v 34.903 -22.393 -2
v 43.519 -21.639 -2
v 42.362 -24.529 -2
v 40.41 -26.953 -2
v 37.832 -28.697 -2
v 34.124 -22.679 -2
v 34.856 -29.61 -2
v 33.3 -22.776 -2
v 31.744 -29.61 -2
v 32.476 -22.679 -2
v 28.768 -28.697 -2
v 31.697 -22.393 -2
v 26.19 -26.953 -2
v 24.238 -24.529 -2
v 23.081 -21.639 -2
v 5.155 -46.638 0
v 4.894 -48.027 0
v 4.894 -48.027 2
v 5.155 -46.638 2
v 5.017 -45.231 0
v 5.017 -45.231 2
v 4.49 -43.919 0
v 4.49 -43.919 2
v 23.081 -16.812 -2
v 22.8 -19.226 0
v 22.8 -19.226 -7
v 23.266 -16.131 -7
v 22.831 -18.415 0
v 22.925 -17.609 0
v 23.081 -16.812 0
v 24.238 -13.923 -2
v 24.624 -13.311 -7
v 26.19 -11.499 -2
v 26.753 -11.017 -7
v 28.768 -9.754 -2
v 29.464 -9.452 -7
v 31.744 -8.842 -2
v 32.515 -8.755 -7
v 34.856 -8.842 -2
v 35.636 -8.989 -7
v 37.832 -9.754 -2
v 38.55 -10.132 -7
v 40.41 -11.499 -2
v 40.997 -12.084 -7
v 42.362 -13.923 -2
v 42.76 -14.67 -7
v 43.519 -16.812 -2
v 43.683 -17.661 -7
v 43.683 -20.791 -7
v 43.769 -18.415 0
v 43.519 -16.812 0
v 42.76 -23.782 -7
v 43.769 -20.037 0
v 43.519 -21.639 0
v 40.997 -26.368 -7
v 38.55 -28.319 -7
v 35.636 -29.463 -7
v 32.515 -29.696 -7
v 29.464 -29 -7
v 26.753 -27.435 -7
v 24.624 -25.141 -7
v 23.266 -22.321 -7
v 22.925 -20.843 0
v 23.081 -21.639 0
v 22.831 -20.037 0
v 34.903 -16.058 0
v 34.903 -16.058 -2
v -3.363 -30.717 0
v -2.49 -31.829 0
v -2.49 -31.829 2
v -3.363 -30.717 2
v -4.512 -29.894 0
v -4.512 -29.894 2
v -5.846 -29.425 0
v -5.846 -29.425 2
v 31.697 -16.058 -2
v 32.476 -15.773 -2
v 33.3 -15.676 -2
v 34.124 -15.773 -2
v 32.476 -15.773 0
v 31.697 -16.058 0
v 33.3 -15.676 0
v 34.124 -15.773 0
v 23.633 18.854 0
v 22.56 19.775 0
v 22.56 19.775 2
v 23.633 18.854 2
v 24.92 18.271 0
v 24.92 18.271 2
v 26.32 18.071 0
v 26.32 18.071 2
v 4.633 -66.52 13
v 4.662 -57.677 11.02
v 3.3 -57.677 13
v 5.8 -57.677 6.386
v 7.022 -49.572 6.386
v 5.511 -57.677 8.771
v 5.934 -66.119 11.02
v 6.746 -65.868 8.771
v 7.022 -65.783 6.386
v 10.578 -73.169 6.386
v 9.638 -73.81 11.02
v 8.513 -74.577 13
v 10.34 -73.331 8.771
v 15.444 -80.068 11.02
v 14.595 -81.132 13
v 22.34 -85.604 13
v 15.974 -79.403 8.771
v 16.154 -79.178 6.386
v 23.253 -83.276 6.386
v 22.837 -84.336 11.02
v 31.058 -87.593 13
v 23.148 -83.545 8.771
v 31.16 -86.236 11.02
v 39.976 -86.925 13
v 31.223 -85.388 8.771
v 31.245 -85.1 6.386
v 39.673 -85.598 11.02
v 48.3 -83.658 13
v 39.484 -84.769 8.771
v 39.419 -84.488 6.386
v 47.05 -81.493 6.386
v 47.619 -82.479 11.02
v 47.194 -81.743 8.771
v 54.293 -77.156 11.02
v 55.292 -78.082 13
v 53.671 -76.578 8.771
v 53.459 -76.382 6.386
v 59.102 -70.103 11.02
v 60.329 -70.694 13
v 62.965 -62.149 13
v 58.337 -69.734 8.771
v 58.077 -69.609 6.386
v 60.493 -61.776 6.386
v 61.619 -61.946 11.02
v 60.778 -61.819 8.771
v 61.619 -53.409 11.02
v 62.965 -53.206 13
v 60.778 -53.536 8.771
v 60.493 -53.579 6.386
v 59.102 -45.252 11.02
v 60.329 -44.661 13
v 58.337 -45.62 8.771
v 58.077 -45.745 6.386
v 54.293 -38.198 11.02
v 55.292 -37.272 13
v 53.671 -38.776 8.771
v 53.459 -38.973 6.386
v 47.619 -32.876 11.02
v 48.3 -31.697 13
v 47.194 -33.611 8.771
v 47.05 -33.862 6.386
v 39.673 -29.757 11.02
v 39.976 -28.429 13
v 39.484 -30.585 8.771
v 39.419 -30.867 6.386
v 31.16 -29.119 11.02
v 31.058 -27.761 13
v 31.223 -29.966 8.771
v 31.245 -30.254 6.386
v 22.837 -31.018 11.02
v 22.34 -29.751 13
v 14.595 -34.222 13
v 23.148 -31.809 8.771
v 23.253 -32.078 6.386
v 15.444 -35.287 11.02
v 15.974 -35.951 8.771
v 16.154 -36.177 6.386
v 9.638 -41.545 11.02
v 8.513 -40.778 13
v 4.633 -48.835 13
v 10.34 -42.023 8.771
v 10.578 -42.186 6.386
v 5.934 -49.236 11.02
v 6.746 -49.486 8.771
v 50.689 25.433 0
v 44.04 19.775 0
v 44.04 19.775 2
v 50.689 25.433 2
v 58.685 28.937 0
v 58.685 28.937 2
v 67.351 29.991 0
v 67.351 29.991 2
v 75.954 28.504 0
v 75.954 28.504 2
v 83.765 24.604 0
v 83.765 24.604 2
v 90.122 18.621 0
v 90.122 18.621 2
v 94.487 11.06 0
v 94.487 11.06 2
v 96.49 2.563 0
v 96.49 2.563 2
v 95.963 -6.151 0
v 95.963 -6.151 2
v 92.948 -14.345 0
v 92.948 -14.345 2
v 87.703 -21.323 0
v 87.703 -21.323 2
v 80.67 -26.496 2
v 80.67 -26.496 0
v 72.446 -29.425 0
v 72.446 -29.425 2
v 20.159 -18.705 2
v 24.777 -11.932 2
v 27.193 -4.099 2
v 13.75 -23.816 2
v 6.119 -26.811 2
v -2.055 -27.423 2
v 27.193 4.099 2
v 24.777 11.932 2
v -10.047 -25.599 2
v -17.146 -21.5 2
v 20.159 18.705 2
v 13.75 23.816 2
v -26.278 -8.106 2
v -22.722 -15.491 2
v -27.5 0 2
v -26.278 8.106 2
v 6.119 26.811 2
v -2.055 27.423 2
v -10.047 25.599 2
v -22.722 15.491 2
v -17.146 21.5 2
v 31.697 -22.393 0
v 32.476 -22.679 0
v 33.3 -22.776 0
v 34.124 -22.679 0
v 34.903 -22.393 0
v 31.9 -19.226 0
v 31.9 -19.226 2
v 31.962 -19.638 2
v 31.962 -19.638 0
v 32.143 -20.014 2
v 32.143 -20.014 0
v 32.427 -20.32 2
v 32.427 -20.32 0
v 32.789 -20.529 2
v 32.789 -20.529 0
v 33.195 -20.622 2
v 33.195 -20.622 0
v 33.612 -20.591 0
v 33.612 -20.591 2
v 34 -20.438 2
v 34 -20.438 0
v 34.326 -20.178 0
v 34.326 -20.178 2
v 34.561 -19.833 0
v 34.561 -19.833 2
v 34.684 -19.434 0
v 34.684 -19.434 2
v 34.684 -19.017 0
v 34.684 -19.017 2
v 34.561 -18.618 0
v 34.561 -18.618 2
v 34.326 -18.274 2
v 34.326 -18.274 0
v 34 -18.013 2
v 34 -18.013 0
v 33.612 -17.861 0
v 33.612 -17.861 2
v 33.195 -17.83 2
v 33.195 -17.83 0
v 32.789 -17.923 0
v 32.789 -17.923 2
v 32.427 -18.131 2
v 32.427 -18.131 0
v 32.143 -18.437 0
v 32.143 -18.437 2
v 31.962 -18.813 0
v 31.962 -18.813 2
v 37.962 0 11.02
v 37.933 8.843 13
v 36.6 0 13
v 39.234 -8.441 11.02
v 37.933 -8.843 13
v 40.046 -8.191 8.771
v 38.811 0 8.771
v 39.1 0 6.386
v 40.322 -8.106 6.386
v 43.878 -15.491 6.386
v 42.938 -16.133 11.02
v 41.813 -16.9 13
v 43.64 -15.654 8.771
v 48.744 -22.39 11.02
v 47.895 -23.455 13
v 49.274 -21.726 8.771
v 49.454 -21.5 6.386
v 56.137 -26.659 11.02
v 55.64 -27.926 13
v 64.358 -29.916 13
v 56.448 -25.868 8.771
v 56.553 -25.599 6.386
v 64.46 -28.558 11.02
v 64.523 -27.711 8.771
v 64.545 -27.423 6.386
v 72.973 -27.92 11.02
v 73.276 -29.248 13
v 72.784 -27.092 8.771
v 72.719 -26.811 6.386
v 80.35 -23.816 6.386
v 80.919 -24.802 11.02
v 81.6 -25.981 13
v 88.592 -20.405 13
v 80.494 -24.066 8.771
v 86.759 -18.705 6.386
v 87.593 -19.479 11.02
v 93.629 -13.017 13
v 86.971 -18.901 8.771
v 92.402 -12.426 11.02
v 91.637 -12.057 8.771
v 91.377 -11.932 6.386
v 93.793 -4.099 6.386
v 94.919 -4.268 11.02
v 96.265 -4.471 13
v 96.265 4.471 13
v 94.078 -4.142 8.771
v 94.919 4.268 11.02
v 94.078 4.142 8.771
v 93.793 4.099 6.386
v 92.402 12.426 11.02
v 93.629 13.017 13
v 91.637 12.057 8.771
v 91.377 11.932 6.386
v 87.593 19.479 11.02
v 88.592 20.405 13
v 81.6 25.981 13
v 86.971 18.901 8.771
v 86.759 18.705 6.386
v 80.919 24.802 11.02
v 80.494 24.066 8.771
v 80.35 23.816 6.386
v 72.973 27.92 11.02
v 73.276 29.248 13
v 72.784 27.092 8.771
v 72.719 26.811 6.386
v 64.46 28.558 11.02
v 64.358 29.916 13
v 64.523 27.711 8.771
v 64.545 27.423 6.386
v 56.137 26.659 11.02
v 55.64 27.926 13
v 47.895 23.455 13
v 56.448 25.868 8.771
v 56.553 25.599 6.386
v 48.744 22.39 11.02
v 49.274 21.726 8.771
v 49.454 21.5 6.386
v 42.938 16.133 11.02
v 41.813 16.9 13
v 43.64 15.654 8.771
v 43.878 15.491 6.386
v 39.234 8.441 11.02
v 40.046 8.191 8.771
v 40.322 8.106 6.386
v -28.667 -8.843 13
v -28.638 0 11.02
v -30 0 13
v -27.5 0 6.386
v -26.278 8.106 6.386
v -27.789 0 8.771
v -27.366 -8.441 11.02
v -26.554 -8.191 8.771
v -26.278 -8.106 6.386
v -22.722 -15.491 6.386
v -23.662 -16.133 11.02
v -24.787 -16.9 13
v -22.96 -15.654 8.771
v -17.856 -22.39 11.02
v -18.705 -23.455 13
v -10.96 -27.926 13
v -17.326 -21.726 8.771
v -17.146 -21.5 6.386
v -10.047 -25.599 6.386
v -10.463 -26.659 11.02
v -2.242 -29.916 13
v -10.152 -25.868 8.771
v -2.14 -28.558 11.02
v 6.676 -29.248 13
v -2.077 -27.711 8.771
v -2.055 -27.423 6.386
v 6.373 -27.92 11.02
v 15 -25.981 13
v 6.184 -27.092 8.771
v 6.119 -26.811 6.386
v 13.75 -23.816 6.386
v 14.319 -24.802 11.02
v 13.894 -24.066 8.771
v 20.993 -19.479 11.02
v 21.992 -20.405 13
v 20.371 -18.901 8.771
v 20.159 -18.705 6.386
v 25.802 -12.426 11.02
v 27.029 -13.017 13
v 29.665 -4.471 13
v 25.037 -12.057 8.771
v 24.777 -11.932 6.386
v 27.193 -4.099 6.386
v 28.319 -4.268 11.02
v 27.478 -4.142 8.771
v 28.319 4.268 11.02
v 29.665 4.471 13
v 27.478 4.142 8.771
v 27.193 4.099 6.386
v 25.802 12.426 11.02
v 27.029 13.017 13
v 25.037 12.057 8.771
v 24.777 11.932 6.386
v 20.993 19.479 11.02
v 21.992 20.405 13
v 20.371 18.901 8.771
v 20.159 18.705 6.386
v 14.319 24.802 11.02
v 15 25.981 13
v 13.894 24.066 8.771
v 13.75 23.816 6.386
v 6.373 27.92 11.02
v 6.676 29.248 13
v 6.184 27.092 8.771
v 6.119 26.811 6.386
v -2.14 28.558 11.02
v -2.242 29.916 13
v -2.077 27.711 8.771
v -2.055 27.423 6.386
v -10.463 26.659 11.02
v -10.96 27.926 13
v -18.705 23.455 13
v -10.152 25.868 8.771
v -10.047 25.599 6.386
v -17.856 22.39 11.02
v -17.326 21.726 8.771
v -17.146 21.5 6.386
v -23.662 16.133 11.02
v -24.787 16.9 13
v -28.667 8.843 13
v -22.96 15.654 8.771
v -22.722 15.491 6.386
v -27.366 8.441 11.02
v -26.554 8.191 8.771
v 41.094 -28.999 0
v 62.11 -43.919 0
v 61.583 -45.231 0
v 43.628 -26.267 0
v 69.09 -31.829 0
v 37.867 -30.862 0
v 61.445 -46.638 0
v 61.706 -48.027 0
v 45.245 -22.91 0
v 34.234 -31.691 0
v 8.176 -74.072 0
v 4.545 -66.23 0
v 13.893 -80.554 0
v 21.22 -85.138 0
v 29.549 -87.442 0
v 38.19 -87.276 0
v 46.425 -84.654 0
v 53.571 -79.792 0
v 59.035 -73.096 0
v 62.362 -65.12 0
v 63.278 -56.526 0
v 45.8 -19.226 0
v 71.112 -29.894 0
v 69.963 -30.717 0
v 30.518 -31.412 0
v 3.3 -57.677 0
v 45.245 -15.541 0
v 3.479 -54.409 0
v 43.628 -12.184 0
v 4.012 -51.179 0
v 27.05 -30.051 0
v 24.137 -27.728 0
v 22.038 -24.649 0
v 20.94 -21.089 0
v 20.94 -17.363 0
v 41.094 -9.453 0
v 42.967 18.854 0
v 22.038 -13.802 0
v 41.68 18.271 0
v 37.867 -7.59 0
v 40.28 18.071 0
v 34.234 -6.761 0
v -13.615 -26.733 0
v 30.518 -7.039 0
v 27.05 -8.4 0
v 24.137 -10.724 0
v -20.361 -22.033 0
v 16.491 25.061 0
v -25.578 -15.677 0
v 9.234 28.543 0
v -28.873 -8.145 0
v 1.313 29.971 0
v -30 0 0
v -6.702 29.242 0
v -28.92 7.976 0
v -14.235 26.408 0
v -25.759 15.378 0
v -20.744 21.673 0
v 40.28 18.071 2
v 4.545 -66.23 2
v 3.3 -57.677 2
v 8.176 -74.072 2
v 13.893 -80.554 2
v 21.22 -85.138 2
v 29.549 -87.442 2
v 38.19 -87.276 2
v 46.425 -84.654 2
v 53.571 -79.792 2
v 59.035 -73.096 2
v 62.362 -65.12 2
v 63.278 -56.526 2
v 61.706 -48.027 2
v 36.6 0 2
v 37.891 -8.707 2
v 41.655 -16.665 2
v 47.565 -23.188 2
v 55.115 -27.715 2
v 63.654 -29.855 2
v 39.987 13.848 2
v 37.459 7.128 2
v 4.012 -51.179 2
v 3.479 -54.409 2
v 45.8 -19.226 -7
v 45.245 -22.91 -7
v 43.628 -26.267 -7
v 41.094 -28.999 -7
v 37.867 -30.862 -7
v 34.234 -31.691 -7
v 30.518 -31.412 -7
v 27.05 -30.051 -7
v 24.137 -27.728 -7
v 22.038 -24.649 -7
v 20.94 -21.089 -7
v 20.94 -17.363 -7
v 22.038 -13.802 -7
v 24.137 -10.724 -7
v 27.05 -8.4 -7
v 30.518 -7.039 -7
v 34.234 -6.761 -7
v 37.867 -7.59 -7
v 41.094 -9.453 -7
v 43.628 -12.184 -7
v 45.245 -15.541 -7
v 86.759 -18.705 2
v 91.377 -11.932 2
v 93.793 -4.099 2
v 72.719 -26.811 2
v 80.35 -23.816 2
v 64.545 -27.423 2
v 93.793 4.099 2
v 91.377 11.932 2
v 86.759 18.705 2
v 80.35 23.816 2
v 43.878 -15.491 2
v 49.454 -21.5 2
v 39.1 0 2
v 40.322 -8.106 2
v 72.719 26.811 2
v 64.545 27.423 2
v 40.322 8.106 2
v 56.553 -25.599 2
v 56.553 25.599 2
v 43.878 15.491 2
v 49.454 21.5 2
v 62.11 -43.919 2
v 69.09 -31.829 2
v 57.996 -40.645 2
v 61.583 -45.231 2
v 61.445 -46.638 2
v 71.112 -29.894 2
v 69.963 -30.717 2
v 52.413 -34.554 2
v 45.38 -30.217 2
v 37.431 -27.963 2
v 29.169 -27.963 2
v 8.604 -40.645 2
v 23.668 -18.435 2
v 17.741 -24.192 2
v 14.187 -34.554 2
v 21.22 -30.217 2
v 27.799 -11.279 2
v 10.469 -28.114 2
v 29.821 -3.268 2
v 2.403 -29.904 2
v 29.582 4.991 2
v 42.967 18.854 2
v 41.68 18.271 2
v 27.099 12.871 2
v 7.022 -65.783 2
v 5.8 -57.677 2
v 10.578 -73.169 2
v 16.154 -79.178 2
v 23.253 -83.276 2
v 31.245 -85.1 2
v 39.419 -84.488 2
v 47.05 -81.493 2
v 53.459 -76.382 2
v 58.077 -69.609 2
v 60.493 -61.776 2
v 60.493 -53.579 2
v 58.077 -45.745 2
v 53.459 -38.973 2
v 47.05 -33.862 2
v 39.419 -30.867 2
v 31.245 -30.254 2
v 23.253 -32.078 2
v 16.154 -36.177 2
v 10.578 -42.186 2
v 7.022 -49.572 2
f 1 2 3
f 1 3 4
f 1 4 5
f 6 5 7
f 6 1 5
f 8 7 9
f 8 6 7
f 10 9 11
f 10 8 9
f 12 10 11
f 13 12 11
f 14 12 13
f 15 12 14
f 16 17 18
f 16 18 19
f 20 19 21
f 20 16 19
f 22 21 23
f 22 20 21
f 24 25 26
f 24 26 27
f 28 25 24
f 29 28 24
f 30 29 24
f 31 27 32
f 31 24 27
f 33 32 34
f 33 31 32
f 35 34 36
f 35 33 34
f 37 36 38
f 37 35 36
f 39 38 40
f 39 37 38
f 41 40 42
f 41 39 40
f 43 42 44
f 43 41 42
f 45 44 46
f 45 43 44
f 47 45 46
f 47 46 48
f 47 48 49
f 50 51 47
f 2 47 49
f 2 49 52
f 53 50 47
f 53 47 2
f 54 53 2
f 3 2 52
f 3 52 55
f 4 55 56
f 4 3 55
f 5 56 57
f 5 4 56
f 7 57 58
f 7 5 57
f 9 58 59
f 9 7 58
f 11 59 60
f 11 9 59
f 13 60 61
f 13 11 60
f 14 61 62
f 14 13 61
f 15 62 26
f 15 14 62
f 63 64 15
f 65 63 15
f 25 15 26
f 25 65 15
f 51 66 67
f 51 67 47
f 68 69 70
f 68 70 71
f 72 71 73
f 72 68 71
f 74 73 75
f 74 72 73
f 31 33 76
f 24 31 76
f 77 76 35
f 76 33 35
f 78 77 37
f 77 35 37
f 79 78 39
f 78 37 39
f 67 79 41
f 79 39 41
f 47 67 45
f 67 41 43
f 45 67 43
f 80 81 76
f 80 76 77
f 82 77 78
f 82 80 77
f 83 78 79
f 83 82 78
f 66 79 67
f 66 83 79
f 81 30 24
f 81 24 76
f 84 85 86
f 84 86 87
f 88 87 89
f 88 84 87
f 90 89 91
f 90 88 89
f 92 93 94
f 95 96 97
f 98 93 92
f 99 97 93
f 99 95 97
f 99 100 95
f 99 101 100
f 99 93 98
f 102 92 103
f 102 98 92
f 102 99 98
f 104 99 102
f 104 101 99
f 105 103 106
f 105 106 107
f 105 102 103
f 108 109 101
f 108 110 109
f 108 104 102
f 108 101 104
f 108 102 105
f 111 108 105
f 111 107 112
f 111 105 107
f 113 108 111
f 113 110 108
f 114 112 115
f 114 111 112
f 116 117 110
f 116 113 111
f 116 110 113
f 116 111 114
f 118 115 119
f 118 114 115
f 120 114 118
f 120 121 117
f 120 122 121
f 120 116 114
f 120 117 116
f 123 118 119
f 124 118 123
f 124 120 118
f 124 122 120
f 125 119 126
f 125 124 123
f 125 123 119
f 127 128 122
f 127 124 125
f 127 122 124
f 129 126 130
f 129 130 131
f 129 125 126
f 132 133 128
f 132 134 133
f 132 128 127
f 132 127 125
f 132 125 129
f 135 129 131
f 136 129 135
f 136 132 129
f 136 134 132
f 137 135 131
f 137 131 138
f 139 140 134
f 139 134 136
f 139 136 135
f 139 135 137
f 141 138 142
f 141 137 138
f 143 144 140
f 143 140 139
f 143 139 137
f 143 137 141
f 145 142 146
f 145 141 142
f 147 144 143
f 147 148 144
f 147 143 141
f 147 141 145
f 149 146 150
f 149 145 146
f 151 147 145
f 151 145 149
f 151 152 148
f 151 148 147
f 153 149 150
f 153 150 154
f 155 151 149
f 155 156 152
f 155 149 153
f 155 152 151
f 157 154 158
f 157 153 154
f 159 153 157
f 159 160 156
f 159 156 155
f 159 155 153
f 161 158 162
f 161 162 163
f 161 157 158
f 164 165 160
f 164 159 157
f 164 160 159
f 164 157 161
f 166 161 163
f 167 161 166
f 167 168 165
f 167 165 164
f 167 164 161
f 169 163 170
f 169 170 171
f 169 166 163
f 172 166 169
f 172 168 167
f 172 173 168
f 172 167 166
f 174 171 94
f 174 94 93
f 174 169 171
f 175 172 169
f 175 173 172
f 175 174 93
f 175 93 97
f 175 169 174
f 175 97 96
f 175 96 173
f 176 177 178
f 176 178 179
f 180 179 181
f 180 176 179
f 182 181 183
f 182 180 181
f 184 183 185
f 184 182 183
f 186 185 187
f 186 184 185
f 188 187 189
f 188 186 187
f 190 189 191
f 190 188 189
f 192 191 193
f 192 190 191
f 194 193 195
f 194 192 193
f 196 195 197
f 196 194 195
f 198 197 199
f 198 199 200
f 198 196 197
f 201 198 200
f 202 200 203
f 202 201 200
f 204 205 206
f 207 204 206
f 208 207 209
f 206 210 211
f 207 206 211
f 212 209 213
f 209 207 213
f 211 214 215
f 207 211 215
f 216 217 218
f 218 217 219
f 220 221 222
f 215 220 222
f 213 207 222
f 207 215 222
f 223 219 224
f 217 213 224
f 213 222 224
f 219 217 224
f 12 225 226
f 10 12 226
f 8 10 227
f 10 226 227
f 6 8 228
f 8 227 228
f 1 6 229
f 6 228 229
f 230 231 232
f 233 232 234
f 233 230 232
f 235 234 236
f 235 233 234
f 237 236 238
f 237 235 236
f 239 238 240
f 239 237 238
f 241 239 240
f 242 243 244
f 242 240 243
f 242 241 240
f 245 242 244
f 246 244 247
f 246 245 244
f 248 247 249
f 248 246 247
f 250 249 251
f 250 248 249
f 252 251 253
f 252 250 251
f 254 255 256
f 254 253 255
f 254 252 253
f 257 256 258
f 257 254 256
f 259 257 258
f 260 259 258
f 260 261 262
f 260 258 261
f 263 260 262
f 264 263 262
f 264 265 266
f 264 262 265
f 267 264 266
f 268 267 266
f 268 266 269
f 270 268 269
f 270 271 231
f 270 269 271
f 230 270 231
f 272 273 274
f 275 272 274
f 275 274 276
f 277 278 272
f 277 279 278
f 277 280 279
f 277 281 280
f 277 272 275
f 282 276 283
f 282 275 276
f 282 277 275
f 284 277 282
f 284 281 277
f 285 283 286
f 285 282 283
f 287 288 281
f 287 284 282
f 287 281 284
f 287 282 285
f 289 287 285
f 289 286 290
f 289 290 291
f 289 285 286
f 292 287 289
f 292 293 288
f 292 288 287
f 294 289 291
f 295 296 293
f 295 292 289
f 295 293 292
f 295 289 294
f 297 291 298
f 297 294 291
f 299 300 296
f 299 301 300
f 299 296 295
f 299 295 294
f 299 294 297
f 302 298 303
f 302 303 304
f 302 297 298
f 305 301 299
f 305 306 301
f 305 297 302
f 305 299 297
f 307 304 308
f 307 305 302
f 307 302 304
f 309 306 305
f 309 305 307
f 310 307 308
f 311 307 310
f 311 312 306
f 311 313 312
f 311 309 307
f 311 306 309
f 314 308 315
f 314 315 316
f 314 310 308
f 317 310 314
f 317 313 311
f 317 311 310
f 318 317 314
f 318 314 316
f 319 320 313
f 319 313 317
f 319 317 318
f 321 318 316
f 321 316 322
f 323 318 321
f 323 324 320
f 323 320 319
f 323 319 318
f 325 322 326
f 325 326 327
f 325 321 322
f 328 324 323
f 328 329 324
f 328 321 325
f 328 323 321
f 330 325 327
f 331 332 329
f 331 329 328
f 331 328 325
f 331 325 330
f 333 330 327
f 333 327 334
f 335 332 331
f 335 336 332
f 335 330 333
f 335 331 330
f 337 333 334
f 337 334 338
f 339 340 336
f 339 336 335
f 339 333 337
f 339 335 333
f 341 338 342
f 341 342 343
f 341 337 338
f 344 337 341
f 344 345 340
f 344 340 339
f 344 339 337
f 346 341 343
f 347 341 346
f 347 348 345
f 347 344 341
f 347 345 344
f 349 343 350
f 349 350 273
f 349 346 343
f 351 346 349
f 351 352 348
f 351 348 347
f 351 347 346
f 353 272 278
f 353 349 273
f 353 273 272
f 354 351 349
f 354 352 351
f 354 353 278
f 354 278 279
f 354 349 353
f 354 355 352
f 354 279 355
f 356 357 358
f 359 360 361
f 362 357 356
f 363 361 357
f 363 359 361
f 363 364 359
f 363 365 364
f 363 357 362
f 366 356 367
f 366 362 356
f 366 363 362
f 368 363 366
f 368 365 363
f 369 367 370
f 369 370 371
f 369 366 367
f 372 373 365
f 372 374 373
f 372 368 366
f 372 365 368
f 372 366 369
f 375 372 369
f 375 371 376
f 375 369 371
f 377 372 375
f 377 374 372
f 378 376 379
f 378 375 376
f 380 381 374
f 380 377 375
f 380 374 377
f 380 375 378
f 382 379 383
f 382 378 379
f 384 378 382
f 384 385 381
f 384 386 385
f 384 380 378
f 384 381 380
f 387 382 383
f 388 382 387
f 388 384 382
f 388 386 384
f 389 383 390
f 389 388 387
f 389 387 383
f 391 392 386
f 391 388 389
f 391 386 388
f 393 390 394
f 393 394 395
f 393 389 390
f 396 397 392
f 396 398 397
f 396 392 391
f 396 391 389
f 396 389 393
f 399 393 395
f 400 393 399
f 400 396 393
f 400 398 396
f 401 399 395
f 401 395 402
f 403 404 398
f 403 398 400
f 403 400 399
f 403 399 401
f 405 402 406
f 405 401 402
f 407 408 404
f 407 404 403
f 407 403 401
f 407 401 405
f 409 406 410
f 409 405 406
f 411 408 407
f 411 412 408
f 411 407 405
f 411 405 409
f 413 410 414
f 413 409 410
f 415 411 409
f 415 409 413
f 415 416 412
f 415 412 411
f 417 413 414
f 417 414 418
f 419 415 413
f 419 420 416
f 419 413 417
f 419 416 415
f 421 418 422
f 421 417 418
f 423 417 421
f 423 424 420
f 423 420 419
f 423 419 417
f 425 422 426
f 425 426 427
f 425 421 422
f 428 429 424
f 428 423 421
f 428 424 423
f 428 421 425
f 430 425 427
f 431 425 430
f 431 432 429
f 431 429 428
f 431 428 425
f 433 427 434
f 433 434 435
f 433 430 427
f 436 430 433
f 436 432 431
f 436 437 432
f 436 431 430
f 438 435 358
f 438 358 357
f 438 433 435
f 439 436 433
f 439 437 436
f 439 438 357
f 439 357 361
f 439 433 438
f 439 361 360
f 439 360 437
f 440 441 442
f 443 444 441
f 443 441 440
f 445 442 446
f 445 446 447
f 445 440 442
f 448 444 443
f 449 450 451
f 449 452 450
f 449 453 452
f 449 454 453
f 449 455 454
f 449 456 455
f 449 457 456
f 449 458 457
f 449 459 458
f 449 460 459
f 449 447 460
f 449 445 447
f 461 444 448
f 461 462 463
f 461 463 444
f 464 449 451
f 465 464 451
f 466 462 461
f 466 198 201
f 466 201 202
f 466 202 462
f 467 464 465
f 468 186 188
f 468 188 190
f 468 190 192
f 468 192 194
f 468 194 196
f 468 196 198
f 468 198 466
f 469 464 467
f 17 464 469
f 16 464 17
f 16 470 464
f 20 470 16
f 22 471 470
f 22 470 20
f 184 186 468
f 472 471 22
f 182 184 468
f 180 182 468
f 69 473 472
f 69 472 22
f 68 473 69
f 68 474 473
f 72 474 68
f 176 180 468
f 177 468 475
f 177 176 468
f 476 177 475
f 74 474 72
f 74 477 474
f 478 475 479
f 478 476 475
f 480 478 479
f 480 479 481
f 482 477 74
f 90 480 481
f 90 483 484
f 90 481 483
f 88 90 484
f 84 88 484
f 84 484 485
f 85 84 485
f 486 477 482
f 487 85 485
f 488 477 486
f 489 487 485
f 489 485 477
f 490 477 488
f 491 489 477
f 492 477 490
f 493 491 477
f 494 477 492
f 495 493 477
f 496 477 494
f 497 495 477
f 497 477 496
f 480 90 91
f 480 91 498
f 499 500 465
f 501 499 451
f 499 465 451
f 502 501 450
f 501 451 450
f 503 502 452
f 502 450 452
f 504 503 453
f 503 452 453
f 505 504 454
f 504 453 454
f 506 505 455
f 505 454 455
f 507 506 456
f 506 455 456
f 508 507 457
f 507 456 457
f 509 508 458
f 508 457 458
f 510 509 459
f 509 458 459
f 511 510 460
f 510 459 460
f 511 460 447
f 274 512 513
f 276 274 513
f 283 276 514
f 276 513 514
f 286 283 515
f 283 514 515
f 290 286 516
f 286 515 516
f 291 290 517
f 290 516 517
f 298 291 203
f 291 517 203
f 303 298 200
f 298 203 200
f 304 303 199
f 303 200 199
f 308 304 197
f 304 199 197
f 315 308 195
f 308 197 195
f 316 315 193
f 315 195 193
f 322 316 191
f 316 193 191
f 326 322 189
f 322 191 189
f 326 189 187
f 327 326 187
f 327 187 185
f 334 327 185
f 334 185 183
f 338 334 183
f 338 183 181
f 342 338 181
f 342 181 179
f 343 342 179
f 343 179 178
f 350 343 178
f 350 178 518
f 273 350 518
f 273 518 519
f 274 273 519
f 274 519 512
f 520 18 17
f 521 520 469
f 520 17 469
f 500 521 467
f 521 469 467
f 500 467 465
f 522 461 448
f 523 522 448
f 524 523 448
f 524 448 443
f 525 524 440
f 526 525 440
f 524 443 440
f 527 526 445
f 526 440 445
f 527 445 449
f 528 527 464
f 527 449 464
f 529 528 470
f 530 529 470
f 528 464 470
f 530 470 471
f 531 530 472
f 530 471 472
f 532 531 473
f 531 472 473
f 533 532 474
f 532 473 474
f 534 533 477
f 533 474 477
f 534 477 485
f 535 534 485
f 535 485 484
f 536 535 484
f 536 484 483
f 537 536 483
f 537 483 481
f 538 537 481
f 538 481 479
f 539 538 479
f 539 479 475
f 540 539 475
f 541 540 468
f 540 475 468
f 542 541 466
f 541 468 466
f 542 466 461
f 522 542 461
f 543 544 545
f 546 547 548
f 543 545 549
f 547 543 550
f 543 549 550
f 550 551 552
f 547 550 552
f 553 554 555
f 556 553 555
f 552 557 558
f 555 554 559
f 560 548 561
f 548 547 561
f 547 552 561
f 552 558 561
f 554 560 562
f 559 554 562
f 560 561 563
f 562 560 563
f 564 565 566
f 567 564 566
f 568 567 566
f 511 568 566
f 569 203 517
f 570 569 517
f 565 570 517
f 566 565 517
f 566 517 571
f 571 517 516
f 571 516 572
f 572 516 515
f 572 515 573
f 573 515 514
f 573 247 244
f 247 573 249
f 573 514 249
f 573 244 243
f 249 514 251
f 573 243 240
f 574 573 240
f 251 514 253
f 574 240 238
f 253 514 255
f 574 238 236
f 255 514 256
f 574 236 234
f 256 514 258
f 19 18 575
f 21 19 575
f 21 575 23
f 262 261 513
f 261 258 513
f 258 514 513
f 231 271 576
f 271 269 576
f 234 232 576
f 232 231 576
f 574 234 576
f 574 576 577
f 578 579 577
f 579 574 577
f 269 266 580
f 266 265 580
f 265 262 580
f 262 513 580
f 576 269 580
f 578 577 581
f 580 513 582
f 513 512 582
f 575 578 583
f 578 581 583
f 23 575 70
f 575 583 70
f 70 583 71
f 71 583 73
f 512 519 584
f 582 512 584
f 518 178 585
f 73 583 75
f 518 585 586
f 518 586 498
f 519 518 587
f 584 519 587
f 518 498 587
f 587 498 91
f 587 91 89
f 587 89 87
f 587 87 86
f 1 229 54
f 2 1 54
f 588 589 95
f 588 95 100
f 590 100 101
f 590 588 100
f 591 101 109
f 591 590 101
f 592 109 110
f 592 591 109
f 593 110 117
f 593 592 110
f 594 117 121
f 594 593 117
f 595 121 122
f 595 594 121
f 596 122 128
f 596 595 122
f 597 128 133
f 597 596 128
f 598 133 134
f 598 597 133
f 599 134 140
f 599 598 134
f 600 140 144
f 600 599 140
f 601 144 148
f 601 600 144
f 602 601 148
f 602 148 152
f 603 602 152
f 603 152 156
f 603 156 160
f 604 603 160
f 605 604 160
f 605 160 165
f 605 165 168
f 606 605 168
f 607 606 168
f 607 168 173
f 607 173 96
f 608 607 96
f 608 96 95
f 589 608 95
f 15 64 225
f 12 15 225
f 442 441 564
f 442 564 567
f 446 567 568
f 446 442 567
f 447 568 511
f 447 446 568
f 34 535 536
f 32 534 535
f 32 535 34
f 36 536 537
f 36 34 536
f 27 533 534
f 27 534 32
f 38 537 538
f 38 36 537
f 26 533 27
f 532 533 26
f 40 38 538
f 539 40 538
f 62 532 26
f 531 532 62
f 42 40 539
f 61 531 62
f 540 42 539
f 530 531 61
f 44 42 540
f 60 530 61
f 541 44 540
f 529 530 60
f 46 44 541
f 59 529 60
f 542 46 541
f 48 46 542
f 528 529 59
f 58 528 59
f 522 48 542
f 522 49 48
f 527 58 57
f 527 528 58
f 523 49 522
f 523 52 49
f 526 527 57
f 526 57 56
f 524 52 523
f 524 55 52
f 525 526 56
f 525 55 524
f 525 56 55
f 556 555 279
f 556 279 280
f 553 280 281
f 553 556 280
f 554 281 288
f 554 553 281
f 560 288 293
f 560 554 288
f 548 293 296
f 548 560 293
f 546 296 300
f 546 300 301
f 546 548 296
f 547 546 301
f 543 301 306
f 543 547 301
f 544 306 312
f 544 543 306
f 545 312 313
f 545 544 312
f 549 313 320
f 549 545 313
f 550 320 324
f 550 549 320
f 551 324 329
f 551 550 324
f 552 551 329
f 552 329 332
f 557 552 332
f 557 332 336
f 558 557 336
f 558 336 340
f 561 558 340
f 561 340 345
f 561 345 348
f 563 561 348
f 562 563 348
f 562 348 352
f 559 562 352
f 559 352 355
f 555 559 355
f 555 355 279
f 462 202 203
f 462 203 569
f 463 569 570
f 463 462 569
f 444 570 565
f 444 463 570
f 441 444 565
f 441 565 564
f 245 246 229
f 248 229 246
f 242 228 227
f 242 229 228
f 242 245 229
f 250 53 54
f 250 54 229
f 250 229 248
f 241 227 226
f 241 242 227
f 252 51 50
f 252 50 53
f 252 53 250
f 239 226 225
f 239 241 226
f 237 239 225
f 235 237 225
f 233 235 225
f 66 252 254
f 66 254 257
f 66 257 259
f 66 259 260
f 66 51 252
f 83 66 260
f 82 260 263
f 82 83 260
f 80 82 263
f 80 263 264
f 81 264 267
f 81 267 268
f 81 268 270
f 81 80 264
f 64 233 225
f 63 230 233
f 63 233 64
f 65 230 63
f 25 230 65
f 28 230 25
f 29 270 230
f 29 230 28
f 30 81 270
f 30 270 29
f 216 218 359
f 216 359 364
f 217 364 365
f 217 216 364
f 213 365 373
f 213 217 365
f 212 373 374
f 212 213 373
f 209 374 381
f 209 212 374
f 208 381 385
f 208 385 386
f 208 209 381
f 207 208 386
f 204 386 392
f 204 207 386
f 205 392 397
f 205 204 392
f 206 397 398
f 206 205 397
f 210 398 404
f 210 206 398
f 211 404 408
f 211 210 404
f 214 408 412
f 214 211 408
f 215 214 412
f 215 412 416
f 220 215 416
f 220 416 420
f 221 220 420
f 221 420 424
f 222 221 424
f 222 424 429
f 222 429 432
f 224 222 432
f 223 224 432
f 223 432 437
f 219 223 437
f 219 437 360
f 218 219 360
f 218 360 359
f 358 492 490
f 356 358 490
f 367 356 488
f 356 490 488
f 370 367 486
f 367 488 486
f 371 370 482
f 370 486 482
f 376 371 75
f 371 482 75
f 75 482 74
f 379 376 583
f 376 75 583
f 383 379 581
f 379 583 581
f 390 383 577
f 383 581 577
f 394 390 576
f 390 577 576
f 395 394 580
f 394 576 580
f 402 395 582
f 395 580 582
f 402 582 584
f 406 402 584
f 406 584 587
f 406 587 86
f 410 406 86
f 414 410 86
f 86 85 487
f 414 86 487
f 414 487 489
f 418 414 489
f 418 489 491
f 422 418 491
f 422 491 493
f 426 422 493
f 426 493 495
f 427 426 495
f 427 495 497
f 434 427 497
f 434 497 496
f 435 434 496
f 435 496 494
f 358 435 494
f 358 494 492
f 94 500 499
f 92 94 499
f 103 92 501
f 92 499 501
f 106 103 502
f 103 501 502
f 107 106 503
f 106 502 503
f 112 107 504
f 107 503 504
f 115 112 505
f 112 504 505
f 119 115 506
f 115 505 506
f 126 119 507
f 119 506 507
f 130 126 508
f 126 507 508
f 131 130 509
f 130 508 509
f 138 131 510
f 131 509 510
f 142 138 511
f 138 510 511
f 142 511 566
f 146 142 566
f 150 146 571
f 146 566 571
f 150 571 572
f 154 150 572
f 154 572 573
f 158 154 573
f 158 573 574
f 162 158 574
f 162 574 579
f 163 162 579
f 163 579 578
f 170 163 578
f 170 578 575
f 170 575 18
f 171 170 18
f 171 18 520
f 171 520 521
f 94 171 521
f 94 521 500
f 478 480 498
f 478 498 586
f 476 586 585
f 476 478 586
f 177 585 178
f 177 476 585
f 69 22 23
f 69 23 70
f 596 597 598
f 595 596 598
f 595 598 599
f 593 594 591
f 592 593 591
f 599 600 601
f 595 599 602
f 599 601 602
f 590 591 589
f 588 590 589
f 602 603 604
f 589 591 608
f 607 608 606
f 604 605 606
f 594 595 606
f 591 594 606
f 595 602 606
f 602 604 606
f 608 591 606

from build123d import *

# Parameters (mm, degrees)
SKETCH_1_R          = 30
SKETCH_1_R_2        = 27.5
EXTRUDE_1_DEPTH     = 13
SKETCH_1_R_3        = 29.999999999999996
EXTRUDE_1_2_DEPTH   = 13
EXTRUDE_1_3_DEPTH   = 13
EXTRUDE_2_DEPTH     = 2
SKETCH_3_R          = 1.3999999999999955
CUT_EXTRUDE_5_DEPTH = 132.10250765535577
FILLET_1_R          = 10
SKETCH_5_R          = 12.500000000000002
SKETCH_5_R_2        = 10.5
EXTRUDE_3_DEPTH     = 7
EXTRUDE_4_DEPTH     = 2


with BuildPart() as part:
    # 草图1 → 凸台-拉伸1 (new body)
    with BuildSketch(Plane.XY):
        with Locations(Location((0, 0, 0), (0, 0, 180))):
            Circle(SKETCH_1_R)
        with Locations(Location((0, 0, 0), (0, 0, 180))):
            Circle(SKETCH_1_R_2, mode=Mode.SUBTRACT)
    extrude(amount=EXTRUDE_1_DEPTH)



with BuildPart() as body_2:
    # 草图1 → Extrude 1 2 (new body)
    with BuildSketch(Plane.XY):
        with Locations(Location((66.6, 0, 0), (0, 0, 180))):
            Circle(SKETCH_1_R_3)
        with Locations(Location((66.6, 0, 0), (0, 0, 180))):
            Circle(SKETCH_1_R_2, mode=Mode.SUBTRACT)
    extrude(amount=EXTRUDE_1_2_DEPTH)


with BuildPart() as body_3:
    # 草图1 → Extrude 1 3 (new body)
    with BuildSketch(Plane.XY):
        with Locations(Location((33.30000000000001, -57.6772918920436, 0), (0, 0, 180))):
            Circle(SKETCH_1_R_3)
        with Locations(Location((33.30000000000001, -57.6772918920436, 0), (0, 0, 180))):
            Circle(SKETCH_1_R_2, mode=Mode.SUBTRACT)
    extrude(amount=EXTRUDE_1_3_DEPTH)


with BuildPart() as part_1:
    add(part.part)

    add(body_2.part)  # 凸台-拉伸2 merges body 2

    add(body_3.part)  # 凸台-拉伸2 merges body 3
    # 草图2 → 凸台-拉伸2 (add)
    with BuildSketch(Plane.XY):
        with BuildLine():
            Line((26.3198925252566, 18.070831312697457), (40.280107474743396, 18.070831312697457))
            ThreePointArc((40.280107474743396, 18.070831312697457), (42.3441853289733, 18.516758123597654), (44.04009212120862, 19.77499826802639))
            ThreePointArc((44.04009212120862, 19.77499826802639), (92.58076211353317, 15), (72.44569692050842, -29.424952464083248))
            ThreePointArc((72.44569692050842, -29.424952464083248), (70.50807559525407, -30.264530756395246), (69.08985272167097, -31.829111208097117))
            Line((69.08985272167097, -31.829111208097117), (62.10974524692759, -43.91901199664395))
            ThreePointArc((62.10974524692759, -43.91901199664395), (61.46389026628078, -45.92951925924603), (61.70560479929982, -48.027337695986766))
            ThreePointArc((61.70560479929982, -48.027337695986766), (33.300000000000004, -87.6772918920436), (4.894395200700185, -48.02733769598677))
            ThreePointArc((4.894395200700185, -48.02733769598677), (5.13610973371921, -45.92951925924604), (4.4902547530724135, -43.91901199664397))
            Line((4.4902547530724135, -43.91901199664397), (-2.489852721670984, -31.829111208097103))
            ThreePointArc((-2.489852721670984, -31.829111208097103), (-3.9080755952540875, -30.264530756395228), (-5.845696920508439, -29.42495246408323))
            ThreePointArc((-5.845696920508439, -29.42495246408323), (-25.980762113533153, 15.000000000000009), (22.55990787879137, 19.77499826802639))
            ThreePointArc((22.55990787879137, 19.77499826802639), (24.25581467102669, 18.516758123597654), (26.3198925252566, 18.070831312697457))
        make_face()
    extrude(amount=EXTRUDE_2_DEPTH)

    # 草图3 → 切除-拉伸5 (cut, through all)
    with BuildSketch(Plane.XY):
        with Locations(Location((33.3, -19.225763964014533, 0), (0, 0, 180))):
            Circle(SKETCH_3_R)
    extrude(amount=CUT_EXTRUDE_5_DEPTH, mode=Mode.SUBTRACT)

    # 圆角1
    # the kernel refuses this fillet: 10 mm, written as the material it takes off along each edge
    with BuildSketch(Plane(origin=(0, 0, 13), x_dir=(-1, 1.2e-16, 0), z_dir=(1.2e-16, 1, 0))) as fillet_1_piece_1:
        with BuildLine():
            CenterArc((37.5, -6.614378277661482), FILLET_1_R, 138.59037789072914, 41.409622109270856)
            Line((27.5, -6.614378277661482), (27.3, -6.614378277661482))
            Line((27.3, -6.614378277661482), (27.3, 0))
            Line((27.3, 0), (27.5, 0.1999999999999993))
            ThreePointArc((27.5, 0.1999999999999993), (28.75, 0.1999999999999993), (29.85, 0.1322875655532254))
            Line((29.85, 0.1322875655532254), (30, -3.55e-15))
        make_face()
    revolve(axis=Axis((0, 0, 13), (0, 0, 1)), mode=Mode.SUBTRACT)
    with BuildSketch(Plane(origin=(66.6, 0, 13), x_dir=(-1, 1.2e-16, 0), z_dir=(1.2e-16, 1, 0))) as fillet_1_piece_2:
        with BuildLine():
            CenterArc((37.5, -6.614378277661482), FILLET_1_R, 138.59037789072914, 41.409622109270856)
            Line((27.5, -6.614378277661482), (27.299999999999997, -6.614378277661482))
            Line((27.299999999999997, -6.614378277661482), (27.299999999999997, 0))
            Line((27.299999999999997, 0), (27.5, 0.1999999999999993))
            ThreePointArc((27.5, 0.1999999999999993), (28.75, 0.1999999999999993), (29.85, 0.1322875655532254))
            Line((29.85, 0.1322875655532254), (30, -3.55e-15))
        make_face()
    revolve(axis=Axis((66.6, 0, 13), (0, 0, 1)), mode=Mode.SUBTRACT)
    with BuildSketch(Plane(origin=(33.30000000000001, -57.6772918920436, 13), x_dir=(-1, 0, 0), z_dir=(0, 1, 0))) as fillet_1_piece_3:
        with BuildLine():
            CenterArc((37.5, -6.614378277661478), FILLET_1_R, 138.59037789072914, 41.409622109270856)
            Line((27.5, -6.614378277661478), (27.3, -6.614378277661478))
            Line((27.3, -6.614378277661478), (27.3, 0))
            Line((27.3, 0), (27.5, 0.1999999999999993))
            ThreePointArc((27.5, 0.1999999999999993), (28.75, 0.1999999999999993), (29.849999999999998, 0.1322875655532254))
            Line((29.849999999999998, 0.1322875655532254), (30, -3.55e-15))
        make_face()
    revolve(axis=Axis((33.30000000000001, -57.6772918920436, 13), (0, 0, 1)), mode=Mode.SUBTRACT)

    # 草图5 → 凸台-拉伸3 (add)
    with BuildSketch(Plane(origin=(0, 0, 0), x_dir=(-1, 0, 0), z_dir=(0, 0, -1))):
        with Locations(Location((-33.3, -19.225763964014533, 0), (0, 0, 180))):
            Circle(SKETCH_5_R)
        with Locations((-33.3, -19.225763964014533)):
            Circle(SKETCH_5_R_2, mode=Mode.SUBTRACT)
    extrude(amount=EXTRUDE_3_DEPTH)

    # 草图6 → 凸台-拉伸4 (add)
    with BuildSketch(Plane(origin=(0, 0, 0), x_dir=(-1, 0, 0), z_dir=(0, 0, -1))):
        with BuildLine():
            Line((-34.90331925395002, -16.05845163809636), (-43.51884380379272, -16.812212366536837))
            ThreePointArc((-43.51884380379272, -16.812212366536837), (-33.3, -8.725763964014526), (-23.08115619620727, -16.812212366536837))
            Line((-23.08115619620727, -16.812212366536837), (-31.69668074604997, -16.05845163809636))
            ThreePointArc((-31.69668074604997, -16.05845163809636), (-33.3, -15.675763964014527), (-34.90331925395002, -16.05845163809636))
        make_face()
        with BuildLine():
            Line((-34.90331925395002, -22.3930762899327), (-43.51884380379272, -21.63931556149223))
            ThreePointArc((-43.51884380379272, -21.63931556149223), (-33.3, -29.725763964014536), (-23.08115619620727, -21.63931556149223))
            Line((-23.08115619620727, -21.63931556149223), (-31.69668074604997, -22.3930762899327))
            ThreePointArc((-31.69668074604997, -22.3930762899327), (-33.3, -22.775763964014537), (-34.90331925395002, -22.3930762899327))
        make_face()
    extrude(amount=EXTRUDE_4_DEPTH)


solid = part_1.part
